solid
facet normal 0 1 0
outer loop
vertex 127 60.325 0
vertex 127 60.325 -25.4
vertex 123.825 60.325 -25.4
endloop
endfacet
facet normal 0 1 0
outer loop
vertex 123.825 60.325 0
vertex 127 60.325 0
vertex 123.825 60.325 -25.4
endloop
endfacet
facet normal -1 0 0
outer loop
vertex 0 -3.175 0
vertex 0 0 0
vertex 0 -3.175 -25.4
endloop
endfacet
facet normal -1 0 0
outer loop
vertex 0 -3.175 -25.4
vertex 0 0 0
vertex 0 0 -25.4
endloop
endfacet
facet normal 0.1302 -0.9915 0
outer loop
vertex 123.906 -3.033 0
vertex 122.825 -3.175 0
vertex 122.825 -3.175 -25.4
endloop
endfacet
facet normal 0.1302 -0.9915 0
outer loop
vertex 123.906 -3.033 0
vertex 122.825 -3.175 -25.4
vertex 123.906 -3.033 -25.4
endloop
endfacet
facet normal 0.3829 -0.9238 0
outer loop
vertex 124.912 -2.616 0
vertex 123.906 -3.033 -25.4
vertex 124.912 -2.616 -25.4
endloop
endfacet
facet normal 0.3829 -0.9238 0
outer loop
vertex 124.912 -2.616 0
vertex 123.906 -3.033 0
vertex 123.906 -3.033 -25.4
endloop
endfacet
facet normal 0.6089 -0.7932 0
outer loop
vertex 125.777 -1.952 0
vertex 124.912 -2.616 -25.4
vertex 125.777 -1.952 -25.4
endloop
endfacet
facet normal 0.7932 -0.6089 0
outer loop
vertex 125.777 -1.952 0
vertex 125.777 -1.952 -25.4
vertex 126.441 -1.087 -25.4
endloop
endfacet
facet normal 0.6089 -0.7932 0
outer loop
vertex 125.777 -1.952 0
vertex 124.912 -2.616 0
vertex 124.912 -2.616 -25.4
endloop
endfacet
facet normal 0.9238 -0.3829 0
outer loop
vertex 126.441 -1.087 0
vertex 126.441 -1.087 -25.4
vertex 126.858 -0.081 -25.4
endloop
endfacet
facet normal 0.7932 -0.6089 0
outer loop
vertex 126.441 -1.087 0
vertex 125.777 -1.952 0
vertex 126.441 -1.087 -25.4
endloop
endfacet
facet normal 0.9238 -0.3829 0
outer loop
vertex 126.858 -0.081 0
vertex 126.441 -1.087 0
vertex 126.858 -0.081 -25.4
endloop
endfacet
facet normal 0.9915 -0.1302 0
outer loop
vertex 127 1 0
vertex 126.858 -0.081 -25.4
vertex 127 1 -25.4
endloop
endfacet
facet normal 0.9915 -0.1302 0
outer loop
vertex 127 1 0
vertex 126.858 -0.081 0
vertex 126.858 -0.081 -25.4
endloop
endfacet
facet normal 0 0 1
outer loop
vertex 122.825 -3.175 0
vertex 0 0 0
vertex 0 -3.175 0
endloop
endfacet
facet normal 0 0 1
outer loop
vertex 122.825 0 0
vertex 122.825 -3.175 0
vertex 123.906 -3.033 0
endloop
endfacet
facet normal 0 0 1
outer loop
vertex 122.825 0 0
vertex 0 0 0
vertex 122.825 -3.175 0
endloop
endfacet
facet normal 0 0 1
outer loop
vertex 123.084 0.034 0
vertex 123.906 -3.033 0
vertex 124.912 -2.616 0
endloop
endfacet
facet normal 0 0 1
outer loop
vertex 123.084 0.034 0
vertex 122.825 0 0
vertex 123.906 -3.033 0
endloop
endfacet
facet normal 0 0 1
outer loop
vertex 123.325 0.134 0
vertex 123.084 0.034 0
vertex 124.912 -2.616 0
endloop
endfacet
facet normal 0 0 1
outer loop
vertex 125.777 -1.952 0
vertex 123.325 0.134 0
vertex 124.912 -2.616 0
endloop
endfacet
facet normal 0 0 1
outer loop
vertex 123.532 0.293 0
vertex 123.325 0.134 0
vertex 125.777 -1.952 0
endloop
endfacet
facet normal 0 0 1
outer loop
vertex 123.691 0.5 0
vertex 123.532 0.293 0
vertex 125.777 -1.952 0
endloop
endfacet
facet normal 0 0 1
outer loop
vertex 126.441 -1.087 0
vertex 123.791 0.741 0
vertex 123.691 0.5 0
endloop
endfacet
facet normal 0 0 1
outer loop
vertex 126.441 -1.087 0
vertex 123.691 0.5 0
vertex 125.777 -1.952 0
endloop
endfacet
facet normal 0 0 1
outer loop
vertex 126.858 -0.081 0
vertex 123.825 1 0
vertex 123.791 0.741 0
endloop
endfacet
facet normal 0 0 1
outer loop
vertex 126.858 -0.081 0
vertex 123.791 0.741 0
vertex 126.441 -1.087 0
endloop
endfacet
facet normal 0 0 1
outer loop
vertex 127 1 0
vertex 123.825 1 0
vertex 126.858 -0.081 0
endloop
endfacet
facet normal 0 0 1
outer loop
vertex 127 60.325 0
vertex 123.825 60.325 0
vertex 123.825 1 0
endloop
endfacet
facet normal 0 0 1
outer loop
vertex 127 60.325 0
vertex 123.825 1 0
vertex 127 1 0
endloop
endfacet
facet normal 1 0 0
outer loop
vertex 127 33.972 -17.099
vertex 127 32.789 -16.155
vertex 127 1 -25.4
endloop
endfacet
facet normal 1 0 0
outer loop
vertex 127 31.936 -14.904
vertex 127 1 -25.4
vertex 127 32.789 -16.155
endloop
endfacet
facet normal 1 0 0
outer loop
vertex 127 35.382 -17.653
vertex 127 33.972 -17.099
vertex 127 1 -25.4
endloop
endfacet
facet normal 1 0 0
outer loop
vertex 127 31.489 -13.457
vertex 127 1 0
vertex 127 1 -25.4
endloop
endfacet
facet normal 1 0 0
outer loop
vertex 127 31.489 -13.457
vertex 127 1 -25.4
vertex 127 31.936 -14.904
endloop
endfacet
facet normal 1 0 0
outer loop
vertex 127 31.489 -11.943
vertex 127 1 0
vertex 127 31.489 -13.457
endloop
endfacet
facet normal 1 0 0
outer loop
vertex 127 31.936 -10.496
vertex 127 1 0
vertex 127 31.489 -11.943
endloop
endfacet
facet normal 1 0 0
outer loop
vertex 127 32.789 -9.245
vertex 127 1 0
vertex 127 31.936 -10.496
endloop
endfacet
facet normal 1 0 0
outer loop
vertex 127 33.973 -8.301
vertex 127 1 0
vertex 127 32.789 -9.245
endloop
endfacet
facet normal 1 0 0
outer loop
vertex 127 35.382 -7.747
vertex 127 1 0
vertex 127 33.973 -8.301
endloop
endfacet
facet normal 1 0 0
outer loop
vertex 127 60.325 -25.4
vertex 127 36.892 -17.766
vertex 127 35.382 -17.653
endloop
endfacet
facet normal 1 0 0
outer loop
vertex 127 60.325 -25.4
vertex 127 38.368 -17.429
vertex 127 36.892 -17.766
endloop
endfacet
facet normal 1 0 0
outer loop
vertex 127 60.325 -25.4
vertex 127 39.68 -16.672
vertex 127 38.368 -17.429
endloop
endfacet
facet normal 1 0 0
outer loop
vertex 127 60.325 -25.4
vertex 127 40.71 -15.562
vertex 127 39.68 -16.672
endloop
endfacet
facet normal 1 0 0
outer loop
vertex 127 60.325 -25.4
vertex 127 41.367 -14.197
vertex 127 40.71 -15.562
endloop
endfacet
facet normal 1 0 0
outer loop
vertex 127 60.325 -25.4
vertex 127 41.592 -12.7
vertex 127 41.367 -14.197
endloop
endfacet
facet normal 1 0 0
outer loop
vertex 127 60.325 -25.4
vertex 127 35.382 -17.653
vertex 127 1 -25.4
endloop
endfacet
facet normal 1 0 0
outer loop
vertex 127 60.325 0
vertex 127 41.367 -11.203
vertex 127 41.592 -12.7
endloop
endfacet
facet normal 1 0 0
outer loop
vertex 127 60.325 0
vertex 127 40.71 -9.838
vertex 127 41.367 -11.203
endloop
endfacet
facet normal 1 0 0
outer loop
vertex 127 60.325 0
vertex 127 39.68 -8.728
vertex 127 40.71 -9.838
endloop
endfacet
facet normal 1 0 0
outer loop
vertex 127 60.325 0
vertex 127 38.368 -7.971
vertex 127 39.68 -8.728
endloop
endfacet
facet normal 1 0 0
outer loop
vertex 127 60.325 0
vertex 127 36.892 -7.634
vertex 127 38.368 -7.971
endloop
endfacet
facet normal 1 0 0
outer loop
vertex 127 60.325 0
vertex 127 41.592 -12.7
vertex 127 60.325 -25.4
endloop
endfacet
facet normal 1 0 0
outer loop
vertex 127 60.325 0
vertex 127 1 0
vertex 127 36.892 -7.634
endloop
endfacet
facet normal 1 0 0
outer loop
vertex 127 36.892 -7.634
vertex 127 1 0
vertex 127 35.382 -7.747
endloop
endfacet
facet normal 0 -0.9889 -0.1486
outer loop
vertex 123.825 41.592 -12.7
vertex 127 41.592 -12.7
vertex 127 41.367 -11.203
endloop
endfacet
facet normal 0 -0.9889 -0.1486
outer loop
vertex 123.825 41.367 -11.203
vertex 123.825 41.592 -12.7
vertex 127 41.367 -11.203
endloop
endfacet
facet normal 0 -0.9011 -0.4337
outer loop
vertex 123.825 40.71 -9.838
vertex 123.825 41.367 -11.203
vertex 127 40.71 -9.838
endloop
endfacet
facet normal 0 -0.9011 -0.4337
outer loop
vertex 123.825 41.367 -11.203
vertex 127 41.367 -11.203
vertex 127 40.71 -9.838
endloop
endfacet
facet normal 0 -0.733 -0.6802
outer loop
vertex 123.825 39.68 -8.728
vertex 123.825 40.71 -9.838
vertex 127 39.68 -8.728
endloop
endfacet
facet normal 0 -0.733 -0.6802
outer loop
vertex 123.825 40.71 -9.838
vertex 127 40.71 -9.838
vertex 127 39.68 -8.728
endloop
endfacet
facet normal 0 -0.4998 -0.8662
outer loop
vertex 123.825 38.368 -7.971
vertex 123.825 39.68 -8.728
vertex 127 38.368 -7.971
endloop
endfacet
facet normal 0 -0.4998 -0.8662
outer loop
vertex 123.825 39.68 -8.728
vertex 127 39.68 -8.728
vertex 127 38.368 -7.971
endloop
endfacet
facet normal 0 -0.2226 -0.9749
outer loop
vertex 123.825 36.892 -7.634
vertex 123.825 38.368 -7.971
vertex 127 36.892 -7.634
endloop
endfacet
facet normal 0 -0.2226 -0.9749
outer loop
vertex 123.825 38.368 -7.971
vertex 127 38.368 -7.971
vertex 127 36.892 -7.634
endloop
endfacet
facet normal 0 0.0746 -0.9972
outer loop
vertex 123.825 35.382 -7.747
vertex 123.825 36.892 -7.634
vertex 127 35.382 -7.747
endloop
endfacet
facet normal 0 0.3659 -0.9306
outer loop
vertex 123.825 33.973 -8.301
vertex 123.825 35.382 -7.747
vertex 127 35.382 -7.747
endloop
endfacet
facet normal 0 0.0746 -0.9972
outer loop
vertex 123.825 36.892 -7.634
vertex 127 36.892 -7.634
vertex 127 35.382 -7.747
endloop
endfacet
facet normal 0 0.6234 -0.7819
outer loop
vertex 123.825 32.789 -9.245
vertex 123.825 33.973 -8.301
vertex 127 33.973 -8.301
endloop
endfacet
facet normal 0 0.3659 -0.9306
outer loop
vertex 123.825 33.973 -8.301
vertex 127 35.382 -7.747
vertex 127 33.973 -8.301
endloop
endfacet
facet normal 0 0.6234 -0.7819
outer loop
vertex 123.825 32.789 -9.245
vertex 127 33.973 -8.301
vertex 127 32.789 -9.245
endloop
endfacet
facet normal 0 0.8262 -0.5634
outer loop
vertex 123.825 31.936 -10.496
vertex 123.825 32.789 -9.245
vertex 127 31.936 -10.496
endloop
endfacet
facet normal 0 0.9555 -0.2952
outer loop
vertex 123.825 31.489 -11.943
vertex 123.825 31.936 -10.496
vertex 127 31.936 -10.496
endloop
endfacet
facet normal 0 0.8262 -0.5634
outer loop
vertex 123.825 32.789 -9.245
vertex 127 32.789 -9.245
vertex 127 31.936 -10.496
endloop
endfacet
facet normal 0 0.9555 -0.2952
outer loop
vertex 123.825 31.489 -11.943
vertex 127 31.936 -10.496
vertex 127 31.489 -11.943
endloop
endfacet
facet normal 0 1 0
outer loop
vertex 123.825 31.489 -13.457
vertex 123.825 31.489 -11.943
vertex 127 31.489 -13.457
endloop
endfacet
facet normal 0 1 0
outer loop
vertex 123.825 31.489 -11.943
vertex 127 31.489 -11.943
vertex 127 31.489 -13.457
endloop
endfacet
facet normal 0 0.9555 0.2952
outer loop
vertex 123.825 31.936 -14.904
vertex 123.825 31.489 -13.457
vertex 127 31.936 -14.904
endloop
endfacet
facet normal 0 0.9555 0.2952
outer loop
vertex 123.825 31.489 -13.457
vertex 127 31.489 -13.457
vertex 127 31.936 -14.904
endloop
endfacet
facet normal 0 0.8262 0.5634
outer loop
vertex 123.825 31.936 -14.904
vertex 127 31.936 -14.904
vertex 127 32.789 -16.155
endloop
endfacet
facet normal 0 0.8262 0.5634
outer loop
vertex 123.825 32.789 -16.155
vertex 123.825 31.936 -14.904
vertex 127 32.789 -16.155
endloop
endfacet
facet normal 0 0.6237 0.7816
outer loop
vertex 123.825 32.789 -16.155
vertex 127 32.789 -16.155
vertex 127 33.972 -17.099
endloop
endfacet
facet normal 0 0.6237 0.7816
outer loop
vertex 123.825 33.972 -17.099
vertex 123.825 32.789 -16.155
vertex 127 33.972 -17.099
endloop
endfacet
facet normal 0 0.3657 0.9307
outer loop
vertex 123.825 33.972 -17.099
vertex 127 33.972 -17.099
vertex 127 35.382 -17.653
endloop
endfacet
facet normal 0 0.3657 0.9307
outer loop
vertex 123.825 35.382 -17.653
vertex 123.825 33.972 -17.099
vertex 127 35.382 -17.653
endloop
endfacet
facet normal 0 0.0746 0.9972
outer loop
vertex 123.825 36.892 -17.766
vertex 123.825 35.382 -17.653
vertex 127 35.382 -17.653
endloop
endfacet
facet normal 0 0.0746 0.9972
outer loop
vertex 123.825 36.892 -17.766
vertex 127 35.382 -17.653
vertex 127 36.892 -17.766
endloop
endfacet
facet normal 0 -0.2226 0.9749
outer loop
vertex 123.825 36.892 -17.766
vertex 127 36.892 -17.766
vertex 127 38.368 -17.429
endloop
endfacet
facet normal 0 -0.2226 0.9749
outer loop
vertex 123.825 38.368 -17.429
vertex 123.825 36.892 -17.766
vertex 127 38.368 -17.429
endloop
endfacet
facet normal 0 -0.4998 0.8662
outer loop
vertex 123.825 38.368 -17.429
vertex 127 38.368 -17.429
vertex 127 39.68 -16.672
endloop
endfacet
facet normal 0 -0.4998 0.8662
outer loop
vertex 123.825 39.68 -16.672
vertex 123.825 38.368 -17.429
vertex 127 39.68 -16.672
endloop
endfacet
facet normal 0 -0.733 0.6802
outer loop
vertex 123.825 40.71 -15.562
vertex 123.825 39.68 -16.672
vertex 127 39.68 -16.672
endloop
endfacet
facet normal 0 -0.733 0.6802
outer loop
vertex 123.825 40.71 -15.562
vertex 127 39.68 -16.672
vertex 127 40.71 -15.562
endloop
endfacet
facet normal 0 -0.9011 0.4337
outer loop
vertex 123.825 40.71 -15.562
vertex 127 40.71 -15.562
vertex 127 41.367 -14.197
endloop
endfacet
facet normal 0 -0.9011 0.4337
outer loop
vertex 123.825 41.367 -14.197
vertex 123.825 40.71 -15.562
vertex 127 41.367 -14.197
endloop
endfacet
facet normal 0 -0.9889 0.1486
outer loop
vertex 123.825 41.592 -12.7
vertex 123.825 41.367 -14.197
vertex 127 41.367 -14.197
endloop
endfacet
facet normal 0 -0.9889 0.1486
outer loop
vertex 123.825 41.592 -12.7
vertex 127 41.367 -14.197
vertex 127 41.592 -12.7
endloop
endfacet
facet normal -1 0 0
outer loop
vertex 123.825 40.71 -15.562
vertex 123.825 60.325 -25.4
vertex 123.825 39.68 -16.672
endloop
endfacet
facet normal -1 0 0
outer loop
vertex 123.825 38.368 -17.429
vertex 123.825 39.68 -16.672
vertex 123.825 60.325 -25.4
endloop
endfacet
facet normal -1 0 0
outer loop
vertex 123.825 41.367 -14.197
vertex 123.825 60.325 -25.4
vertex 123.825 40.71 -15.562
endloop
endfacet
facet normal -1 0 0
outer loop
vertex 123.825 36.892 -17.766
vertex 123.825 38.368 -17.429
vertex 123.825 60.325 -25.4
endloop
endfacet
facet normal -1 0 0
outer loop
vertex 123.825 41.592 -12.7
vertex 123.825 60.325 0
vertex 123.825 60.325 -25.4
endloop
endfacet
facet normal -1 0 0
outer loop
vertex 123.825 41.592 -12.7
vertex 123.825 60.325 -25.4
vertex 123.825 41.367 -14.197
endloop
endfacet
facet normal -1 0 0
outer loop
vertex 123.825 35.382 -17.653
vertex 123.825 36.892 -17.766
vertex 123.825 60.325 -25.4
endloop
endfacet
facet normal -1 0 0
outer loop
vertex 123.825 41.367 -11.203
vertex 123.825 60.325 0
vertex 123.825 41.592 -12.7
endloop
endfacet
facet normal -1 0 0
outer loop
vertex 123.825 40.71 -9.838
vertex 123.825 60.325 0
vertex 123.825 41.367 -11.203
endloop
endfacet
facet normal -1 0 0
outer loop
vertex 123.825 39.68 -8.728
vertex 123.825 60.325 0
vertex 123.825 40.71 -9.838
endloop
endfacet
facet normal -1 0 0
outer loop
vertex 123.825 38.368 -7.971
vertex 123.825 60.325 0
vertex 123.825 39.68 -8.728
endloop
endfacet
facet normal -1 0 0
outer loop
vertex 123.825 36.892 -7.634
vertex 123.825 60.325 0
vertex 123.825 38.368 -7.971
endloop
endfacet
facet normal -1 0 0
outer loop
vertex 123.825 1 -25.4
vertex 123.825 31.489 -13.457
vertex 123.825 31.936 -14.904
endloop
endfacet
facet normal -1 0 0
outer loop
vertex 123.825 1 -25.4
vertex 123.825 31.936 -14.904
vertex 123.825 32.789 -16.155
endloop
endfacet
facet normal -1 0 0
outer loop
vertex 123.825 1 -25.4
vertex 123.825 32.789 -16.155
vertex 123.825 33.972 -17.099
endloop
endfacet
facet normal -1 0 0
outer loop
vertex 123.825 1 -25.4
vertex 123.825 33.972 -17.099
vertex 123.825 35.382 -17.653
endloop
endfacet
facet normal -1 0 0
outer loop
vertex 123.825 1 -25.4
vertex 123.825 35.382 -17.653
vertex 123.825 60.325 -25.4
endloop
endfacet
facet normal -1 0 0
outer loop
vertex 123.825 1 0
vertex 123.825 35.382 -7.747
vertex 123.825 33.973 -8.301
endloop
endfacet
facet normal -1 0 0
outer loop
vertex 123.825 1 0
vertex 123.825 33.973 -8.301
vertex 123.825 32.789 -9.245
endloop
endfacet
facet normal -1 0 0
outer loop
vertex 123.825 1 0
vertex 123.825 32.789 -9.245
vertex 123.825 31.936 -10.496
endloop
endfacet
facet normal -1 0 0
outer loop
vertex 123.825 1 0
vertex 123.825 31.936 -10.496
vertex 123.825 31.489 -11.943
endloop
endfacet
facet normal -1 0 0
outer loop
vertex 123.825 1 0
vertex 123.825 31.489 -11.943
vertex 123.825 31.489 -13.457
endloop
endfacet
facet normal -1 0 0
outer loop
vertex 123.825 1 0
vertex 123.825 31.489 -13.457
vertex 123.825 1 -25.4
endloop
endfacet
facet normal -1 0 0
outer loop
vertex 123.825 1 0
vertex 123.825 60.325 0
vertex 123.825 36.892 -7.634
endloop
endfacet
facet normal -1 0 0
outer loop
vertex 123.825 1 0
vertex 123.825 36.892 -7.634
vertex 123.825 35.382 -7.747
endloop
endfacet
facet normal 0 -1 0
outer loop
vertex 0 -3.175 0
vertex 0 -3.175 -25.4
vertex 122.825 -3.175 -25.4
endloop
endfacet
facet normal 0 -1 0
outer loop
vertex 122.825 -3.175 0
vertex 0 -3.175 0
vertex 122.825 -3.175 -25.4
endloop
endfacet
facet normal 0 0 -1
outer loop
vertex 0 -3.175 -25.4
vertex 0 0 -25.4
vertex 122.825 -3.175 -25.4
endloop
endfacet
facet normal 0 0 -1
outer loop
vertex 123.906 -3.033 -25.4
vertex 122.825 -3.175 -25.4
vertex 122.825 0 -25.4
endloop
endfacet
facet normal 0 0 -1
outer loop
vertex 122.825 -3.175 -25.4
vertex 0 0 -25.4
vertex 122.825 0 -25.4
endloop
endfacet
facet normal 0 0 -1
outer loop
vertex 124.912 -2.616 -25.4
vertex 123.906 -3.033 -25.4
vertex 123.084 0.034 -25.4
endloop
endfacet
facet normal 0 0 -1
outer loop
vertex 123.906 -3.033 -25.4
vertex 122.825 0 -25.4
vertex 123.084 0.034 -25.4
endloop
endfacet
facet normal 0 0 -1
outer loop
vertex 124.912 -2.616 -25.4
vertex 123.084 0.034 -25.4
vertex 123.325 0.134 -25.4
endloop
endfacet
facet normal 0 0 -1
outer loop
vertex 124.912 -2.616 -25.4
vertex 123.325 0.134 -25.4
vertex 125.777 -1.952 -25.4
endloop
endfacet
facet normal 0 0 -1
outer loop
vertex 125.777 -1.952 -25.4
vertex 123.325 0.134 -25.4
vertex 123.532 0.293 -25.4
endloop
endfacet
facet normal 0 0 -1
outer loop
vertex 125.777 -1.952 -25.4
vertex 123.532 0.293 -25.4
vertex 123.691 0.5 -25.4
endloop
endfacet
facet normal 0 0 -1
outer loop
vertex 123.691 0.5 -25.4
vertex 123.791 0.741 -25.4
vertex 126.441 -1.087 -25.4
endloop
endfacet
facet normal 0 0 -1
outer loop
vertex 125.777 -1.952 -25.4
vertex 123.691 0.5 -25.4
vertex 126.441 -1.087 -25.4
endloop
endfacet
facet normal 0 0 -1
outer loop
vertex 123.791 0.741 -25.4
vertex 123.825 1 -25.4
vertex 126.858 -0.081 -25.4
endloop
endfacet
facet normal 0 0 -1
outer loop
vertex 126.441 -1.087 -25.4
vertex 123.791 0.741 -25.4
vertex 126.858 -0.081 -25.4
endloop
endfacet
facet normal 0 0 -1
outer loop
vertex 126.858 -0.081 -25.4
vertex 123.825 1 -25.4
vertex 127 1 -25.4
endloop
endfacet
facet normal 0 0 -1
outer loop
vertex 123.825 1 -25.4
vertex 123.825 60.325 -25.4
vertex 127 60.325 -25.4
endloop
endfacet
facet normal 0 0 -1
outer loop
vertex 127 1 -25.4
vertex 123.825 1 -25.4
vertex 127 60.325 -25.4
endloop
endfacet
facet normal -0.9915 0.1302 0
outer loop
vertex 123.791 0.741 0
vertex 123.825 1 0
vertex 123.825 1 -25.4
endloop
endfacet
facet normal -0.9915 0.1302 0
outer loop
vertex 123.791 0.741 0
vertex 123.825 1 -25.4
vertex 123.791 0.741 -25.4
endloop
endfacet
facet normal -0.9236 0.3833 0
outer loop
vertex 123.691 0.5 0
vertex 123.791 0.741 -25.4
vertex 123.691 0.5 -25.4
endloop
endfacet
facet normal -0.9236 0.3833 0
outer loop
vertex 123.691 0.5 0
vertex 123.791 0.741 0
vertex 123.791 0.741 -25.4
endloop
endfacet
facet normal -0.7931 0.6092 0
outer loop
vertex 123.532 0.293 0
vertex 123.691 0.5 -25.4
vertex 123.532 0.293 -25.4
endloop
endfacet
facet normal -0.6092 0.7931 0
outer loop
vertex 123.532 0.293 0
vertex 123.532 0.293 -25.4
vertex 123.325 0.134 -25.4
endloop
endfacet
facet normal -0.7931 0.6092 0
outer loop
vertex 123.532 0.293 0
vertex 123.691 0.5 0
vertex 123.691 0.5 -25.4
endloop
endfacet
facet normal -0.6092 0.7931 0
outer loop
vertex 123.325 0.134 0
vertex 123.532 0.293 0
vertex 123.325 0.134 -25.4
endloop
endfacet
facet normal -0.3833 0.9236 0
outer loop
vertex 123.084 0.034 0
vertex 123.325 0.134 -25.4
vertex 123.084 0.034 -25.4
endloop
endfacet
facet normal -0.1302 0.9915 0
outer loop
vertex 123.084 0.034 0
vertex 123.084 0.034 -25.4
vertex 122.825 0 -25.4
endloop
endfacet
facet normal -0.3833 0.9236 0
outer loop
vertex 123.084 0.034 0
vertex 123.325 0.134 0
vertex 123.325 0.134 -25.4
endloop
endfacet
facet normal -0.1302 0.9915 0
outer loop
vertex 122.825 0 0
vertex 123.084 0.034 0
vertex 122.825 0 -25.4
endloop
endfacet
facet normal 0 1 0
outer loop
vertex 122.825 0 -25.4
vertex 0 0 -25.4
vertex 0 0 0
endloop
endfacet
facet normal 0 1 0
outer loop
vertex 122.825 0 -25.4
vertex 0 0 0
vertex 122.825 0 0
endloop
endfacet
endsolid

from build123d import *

# Parameters (mm, degrees)
SKETCH2_W                    = 127
SKETCH2_H                    = 25.4
BASE_FLANGE1_DEPTH           = 3.175
EDGE_FLANGE1_STRIP_W         = 14.7
EDGE_FLANGE1_STRIP_H         = 3.175
EDGE_FLANGE1_STRIP_CUT_DEPTH = 25.4
EDGE_FLANGE1_DEPTH           = 25.4
CUT_EXTRUDE1_REACH           = 144.875
SKETCH10_R                   = 5.08


# Sheet-metal steps are written as plain solids
with BuildPart() as part:
    # Sketch2 → Base-Flange1 (new body)
    with BuildSketch(Plane(origin=(0, 0, 0), x_dir=(1, 0, 0), z_dir=(0, 1, 0))):
        with Locations((63.5, 12.7)):
            Rectangle(SKETCH2_W, SKETCH2_H)
    extrude(amount=-BASE_FLANGE1_DEPTH)

    # Edge-Flange1 strip (across the edge) → Edge-Flange1 strip cut (cut)
    with BuildSketch(Plane(origin=(127, 0, 0), x_dir=(-1, 0, 0), z_dir=(0, 0, -1))):
        with Locations((-3.175, -1.5875)):
            Rectangle(EDGE_FLANGE1_STRIP_W, EDGE_FLANGE1_STRIP_H)
    extrude(amount=EDGE_FLANGE1_STRIP_CUT_DEPTH, mode=Mode.SUBTRACT)

    # Edge-Flange1 section (across the edge) → Edge-Flange1 (add)
    with BuildSketch(Plane(origin=(127, 0, 0), x_dir=(-1, 0, 0), z_dir=(0, 0, -1))):
        with BuildLine():
            Line((0, 1), (0, 60.325))
            Line((0, 60.325), (3.175, 60.325))
            Line((3.175, 60.325), (3.175, 1))
            ThreePointArc((3.175, 1), (3.467893219, 0.292893219), (4.175, 0))
            Line((4.175, 0), (4.175, -3.175))
            ThreePointArc((4.175, -3.175), (1.222829189, -1.952170811), (0, 1))
        make_face()
    extrude(amount=EDGE_FLANGE1_DEPTH)

    # Sketch10 → Cut-Extrude1 (cut, up to next)
    with BuildSketch(Plane(origin=(127, 0, 0), x_dir=(0, 0, -1), z_dir=(1, 0, 0)), mode=Mode.PRIVATE) as cut_extrude1_sk1:
        with Locations(Location((12.7, 36.5125, 0), (0, 0, 90))):
            Circle(SKETCH10_R)
    cut_extrude1_tool1 = extrude(cut_extrude1_sk1.sketch, amount=-CUT_EXTRUDE1_REACH, mode=Mode.PRIVATE) & part.part
    add(cut_extrude1_tool1.solids().sort_by_distance((127, 36.5125, -12.7))[0], mode=Mode.SUBTRACT)


solid = part.part
